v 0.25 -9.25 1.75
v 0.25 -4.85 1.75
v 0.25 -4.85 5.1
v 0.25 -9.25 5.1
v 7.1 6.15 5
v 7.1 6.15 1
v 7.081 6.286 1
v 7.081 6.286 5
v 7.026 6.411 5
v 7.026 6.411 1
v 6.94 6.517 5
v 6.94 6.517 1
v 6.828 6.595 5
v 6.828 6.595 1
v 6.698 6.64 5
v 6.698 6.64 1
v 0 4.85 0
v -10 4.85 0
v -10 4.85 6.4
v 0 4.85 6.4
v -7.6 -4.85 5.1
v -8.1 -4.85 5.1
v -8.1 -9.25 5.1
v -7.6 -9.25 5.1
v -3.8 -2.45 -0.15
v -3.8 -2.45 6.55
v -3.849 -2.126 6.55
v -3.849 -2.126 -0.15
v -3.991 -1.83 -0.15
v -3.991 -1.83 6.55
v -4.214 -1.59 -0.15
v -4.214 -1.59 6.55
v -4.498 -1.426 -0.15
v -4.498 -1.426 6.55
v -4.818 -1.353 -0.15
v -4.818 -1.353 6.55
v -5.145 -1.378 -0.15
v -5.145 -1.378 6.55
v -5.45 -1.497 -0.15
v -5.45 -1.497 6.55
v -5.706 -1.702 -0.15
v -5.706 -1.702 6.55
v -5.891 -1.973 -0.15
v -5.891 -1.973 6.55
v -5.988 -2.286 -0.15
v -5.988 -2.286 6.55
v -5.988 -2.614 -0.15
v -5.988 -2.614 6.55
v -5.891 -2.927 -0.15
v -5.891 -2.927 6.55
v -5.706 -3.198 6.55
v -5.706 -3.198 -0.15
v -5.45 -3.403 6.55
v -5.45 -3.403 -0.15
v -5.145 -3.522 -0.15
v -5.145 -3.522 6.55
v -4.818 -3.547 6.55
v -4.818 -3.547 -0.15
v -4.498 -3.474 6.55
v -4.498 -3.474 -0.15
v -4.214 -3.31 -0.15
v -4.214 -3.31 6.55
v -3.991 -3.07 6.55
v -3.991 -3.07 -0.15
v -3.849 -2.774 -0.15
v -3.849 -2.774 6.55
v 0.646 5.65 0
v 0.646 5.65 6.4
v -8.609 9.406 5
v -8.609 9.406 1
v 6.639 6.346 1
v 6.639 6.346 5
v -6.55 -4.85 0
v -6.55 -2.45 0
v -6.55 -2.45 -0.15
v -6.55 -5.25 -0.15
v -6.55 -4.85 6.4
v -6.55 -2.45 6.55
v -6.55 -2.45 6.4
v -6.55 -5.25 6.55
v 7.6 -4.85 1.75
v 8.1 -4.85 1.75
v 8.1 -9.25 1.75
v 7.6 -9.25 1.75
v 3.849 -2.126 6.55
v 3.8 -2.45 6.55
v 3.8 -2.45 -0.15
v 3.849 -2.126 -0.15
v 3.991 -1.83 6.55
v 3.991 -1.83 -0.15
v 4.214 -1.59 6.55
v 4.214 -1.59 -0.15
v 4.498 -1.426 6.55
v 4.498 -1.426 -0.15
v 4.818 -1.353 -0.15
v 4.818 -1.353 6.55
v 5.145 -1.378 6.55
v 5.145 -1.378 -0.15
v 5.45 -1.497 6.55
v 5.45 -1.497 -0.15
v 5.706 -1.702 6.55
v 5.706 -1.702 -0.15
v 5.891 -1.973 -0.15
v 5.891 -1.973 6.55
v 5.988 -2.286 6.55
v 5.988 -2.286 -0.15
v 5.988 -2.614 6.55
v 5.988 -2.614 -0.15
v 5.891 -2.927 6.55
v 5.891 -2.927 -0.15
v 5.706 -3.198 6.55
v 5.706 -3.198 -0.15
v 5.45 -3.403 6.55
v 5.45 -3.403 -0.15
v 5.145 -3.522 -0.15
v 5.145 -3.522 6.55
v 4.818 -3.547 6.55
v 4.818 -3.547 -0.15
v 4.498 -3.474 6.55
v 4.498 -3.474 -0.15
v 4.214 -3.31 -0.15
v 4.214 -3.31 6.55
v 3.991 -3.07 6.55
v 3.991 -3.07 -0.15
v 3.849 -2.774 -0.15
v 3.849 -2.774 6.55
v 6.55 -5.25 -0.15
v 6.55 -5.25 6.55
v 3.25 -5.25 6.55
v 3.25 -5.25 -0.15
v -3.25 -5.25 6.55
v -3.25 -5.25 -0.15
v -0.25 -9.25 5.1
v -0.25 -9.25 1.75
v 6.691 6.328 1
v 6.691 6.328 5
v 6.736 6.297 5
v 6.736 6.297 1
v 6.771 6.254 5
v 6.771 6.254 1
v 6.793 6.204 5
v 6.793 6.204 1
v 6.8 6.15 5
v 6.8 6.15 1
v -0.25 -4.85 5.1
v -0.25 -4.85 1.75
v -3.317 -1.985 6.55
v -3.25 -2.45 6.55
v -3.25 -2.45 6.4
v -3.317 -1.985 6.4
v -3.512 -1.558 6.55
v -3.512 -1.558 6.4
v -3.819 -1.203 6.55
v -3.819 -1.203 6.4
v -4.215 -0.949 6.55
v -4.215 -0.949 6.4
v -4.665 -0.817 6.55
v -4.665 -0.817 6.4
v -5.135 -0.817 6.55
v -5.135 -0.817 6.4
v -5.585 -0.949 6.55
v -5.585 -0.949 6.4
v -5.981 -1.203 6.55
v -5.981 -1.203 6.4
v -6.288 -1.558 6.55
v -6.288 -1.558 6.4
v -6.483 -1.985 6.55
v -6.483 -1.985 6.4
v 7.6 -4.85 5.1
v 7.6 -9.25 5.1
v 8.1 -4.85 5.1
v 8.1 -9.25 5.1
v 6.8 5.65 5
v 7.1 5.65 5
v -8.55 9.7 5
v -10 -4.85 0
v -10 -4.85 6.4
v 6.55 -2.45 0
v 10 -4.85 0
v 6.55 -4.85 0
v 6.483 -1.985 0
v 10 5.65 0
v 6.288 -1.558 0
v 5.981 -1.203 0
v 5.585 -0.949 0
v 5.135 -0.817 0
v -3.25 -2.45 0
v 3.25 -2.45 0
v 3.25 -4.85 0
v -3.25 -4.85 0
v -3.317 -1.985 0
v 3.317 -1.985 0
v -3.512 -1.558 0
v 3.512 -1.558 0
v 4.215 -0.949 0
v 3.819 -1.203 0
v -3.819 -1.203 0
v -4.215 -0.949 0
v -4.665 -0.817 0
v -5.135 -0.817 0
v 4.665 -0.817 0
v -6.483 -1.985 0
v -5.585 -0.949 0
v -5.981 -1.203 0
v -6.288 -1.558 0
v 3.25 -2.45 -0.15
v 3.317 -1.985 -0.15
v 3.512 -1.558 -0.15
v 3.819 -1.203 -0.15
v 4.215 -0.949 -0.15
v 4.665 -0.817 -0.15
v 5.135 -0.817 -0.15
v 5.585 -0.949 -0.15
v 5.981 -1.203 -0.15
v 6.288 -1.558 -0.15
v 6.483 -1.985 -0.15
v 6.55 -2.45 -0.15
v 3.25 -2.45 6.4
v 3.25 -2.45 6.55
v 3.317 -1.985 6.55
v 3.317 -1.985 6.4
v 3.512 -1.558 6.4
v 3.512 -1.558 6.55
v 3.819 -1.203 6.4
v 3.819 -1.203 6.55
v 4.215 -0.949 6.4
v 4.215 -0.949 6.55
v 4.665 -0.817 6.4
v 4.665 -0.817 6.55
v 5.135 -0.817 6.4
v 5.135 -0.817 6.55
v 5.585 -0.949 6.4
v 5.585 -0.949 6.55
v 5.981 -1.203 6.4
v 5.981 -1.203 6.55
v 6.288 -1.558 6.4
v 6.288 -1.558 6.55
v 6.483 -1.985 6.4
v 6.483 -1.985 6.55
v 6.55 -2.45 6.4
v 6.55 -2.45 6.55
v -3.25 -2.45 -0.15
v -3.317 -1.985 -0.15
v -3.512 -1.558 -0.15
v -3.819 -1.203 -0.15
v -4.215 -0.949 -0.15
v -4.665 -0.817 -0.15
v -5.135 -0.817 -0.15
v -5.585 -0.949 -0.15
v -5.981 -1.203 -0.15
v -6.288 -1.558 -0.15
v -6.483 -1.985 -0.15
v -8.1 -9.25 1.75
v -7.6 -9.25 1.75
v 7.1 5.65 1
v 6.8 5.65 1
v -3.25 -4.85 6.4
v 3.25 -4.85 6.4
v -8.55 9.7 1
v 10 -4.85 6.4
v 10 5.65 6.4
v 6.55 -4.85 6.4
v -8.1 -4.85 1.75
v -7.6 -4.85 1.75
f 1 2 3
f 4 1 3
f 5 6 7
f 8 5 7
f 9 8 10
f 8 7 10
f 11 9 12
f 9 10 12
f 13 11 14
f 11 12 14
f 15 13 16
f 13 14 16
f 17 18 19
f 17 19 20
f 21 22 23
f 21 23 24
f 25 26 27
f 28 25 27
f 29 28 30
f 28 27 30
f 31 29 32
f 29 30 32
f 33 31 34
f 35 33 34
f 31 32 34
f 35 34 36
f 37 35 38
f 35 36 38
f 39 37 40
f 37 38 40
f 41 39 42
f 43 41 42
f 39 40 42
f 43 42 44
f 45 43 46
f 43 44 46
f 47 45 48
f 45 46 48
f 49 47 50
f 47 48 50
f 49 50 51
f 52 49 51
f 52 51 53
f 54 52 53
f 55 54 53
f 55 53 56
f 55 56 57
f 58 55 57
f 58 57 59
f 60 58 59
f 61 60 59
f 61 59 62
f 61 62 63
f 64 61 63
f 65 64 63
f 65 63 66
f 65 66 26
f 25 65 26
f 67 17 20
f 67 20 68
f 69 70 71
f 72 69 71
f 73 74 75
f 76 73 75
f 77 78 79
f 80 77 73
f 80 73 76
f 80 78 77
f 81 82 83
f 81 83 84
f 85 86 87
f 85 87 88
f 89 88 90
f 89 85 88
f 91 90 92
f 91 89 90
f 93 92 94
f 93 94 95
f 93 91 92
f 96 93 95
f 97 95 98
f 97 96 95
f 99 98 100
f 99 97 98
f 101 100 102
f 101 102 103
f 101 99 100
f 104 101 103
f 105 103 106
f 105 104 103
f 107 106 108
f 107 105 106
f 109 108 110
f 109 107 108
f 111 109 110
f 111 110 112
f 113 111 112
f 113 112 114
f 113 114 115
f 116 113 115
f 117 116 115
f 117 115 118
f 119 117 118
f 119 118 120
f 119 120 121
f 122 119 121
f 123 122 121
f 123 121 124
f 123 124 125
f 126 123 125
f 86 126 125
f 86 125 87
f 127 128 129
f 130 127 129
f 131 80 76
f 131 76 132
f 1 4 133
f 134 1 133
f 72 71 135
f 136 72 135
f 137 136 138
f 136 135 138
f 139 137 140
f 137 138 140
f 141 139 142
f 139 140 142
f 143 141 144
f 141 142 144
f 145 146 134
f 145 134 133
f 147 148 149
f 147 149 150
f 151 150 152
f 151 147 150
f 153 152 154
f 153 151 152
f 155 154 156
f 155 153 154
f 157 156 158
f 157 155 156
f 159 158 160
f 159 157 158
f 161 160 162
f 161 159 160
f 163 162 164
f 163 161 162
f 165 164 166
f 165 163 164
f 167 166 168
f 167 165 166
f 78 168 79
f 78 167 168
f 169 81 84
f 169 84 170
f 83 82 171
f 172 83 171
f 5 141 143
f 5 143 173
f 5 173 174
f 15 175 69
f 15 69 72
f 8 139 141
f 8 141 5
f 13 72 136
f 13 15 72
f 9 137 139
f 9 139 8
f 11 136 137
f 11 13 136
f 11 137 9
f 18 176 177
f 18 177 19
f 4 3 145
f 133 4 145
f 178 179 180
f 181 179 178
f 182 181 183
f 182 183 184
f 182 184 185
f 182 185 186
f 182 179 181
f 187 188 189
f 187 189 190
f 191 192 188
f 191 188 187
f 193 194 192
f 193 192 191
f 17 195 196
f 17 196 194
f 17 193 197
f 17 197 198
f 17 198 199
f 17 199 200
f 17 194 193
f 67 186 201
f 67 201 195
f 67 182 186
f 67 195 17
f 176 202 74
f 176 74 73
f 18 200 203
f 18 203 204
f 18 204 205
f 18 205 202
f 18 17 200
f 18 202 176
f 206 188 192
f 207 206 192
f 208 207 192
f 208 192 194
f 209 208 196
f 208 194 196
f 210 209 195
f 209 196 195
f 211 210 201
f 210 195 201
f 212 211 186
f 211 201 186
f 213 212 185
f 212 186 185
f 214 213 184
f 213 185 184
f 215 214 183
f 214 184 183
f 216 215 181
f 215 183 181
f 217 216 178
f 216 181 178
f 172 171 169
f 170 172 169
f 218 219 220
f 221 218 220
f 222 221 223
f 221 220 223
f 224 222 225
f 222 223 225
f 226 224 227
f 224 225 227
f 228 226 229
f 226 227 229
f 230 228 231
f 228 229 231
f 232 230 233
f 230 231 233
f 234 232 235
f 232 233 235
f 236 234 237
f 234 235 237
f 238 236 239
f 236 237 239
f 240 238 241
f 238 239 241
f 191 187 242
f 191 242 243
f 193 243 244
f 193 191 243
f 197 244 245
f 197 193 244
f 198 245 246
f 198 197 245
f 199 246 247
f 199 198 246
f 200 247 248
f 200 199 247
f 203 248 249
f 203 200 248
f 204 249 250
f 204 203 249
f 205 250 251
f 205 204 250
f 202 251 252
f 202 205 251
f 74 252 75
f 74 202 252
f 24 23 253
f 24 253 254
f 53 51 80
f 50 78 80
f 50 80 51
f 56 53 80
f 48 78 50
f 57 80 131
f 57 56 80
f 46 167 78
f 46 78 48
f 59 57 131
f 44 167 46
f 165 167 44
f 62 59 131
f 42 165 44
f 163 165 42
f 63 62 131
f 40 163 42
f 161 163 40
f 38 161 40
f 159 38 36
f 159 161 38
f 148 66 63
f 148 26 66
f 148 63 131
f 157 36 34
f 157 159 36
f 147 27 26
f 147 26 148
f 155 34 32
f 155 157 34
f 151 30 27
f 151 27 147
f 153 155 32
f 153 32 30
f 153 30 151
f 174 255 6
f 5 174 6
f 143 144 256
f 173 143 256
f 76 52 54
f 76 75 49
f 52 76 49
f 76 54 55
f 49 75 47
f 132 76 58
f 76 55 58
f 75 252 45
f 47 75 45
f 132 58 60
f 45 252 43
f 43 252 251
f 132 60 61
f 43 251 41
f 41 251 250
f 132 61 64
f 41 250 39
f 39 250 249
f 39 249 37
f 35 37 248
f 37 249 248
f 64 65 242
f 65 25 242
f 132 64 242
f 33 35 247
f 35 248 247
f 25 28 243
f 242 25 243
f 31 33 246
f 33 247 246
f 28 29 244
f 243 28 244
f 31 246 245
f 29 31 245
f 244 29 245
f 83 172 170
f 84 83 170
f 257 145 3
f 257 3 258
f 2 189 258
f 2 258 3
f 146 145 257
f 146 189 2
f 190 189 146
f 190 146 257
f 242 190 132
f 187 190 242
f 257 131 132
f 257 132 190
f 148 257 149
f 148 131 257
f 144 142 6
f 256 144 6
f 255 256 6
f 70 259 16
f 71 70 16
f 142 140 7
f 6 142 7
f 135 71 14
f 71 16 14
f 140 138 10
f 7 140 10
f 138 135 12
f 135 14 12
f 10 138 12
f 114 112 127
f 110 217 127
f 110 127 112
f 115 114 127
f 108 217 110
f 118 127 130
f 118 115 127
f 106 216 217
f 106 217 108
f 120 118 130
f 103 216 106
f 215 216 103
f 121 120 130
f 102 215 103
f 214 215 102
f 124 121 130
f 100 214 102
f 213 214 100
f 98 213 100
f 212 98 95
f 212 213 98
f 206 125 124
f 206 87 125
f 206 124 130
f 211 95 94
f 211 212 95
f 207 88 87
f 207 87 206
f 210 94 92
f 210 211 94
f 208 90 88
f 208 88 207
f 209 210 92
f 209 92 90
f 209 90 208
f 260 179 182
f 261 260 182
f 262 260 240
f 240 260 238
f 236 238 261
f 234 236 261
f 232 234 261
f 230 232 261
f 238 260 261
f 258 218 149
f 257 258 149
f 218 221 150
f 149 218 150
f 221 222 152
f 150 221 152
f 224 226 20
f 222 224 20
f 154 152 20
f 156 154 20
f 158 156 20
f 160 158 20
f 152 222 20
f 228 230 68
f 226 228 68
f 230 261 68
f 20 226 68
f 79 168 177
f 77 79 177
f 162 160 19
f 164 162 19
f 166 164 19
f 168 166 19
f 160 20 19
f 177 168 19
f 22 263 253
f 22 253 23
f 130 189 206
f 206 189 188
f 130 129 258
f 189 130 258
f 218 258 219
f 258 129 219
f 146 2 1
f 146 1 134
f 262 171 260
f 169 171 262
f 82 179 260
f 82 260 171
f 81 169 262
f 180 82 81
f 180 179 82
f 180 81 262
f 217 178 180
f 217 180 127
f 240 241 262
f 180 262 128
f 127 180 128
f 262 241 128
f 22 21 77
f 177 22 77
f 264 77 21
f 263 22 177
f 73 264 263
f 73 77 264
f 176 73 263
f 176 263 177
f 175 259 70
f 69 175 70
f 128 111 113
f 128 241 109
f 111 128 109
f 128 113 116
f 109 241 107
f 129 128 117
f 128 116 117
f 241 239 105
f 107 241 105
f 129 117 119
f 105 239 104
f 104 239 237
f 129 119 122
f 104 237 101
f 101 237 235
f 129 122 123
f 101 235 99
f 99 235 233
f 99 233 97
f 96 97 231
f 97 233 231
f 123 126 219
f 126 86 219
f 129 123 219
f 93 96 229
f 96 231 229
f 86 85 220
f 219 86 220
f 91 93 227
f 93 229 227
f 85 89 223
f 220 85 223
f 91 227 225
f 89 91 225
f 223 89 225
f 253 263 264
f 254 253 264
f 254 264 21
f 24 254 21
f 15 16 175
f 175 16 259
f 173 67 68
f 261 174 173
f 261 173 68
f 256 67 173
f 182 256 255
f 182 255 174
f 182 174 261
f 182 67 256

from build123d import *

# Parameters (mm, degrees)
BOSS_EXTRUDE1_DEPTH = 6.4
SKETCH3_R           = 1.1
CUT_EXTRUDE1_DEPTH  = 14.148478999
BOSS_EXTRUDE2_START = 0.15
SKETCH4_R           = 1.1
BOSS_EXTRUDE2_DEPTH = 6.7
SKETCH5_W           = 0.5
SKETCH5_H           = 3.35
BOSS_EXTRUDE3_DEPTH = 4.4
SKETCH6_W           = 0.5
SKETCH6_H           = 3.35
BOSS_EXTRUDE4_DEPTH = 4.4
EXTRUDE_THIN2_START = -1
EXTRUDE_THIN2_DEPTH = 4


with BuildPart() as part:
    # Sketch1 → Boss-Extrude1 (new body)
    with BuildSketch(Plane.XY):
        Polygon((-10, 4.85), (0, 4.85), (0.64599961, 5.65), (10, 5.65), (10, 4.85), (10, -4.85), (-10, -4.85), align=None)
    extrude(amount=BOSS_EXTRUDE1_DEPTH)

    # Sketch3 → Cut-Extrude1 (cut, through all)
    with BuildSketch(Plane.XY.offset(6.4)):
        with Locations((-4.9, -2.45)):
            Circle(SKETCH3_R)
    cut_extrude1 = extrude(amount=-CUT_EXTRUDE1_DEPTH, mode=Mode.SUBTRACT)

    # Sketch4 → Boss-Extrude2 (add)
    with BuildSketch(Plane.XY.offset(6.4).offset(BOSS_EXTRUDE2_START)):
        with BuildLine():
            Line((-6.55, -2.45), (-6.55, -5.25))
            Line((-6.55, -5.25), (-3.25, -5.25))
            Line((-3.25, -5.25), (-3.25, -2.45))
            ThreePointArc((-3.25, -2.45), (-4.9, -0.8), (-6.55, -2.45))
        make_face()
        with Locations((-4.9, -2.45)):
            Circle(SKETCH4_R, mode=Mode.SUBTRACT)
    boss_extrude2 = extrude(amount=-BOSS_EXTRUDE2_DEPTH)

    # Sketch5 → Boss-Extrude3 (add)
    with BuildSketch(Plane.XZ.offset(4.85)):
        with Locations((-7.85, 3.425)):
            Rectangle(SKETCH5_W, SKETCH5_H)
    boss_extrude3 = extrude(amount=BOSS_EXTRUDE3_DEPTH)

    # Sketch6 → Boss-Extrude4 (add)
    with BuildSketch(Plane(origin=(0, -4.85, -4.85), x_dir=(-1, 0, 0), z_dir=(0, 1, 0))):
        with Locations((0, 8.275)):
            Rectangle(SKETCH6_W, SKETCH6_H)
    extrude(amount=-BOSS_EXTRUDE4_DEPTH)

    # Mirror1: Cut-Extrude1, Boss-Extrude2, Boss-Extrude3 across plane
    add(cut_extrude1.mirror(Plane(origin=(0, 0, 0), x_dir=(0, 0, 1), z_dir=(1, 0, 0))), mode=Mode.SUBTRACT)
    add(boss_extrude2.mirror(Plane(origin=(0, 0, 0), x_dir=(0, 0, 1), z_dir=(1, 0, 0))))
    add(boss_extrude3.mirror(Plane(origin=(0, 0, 0), x_dir=(0, 0, 1), z_dir=(1, 0, 0))))

    # Sketch7 → Extrude-Thin2 (add)
    with BuildSketch(Plane(origin=(0, 0, 0), x_dir=(-1, 0, 0), z_dir=(0, 0, -1)).offset(EXTRUDE_THIN2_START)):
        with BuildLine():
            Line((-7.1, 5.65), (-7.1, 6.15))
            ThreePointArc((-7.1, 6.15), (-6.986771965, 6.466871341), (-6.698370212, 6.640227806))
            Line((-6.698370212, 6.640227806), (8.55, 9.7))
            Line((8.55, 9.7), (8.609022127, 9.405863317))
            Line((8.609022127, 9.405863317), (-6.639348085, 6.346091122))
            ThreePointArc((-6.639348085, 6.346091122), (-6.754708786, 6.276748537), (-6.8, 6.15))
            Line((-6.8, 6.15), (-6.8, 5.65))
            Line((-6.8, 5.65), (-7.1, 5.65))
        make_face()
    extrude(amount=-EXTRUDE_THIN2_DEPTH)


solid = part.part
